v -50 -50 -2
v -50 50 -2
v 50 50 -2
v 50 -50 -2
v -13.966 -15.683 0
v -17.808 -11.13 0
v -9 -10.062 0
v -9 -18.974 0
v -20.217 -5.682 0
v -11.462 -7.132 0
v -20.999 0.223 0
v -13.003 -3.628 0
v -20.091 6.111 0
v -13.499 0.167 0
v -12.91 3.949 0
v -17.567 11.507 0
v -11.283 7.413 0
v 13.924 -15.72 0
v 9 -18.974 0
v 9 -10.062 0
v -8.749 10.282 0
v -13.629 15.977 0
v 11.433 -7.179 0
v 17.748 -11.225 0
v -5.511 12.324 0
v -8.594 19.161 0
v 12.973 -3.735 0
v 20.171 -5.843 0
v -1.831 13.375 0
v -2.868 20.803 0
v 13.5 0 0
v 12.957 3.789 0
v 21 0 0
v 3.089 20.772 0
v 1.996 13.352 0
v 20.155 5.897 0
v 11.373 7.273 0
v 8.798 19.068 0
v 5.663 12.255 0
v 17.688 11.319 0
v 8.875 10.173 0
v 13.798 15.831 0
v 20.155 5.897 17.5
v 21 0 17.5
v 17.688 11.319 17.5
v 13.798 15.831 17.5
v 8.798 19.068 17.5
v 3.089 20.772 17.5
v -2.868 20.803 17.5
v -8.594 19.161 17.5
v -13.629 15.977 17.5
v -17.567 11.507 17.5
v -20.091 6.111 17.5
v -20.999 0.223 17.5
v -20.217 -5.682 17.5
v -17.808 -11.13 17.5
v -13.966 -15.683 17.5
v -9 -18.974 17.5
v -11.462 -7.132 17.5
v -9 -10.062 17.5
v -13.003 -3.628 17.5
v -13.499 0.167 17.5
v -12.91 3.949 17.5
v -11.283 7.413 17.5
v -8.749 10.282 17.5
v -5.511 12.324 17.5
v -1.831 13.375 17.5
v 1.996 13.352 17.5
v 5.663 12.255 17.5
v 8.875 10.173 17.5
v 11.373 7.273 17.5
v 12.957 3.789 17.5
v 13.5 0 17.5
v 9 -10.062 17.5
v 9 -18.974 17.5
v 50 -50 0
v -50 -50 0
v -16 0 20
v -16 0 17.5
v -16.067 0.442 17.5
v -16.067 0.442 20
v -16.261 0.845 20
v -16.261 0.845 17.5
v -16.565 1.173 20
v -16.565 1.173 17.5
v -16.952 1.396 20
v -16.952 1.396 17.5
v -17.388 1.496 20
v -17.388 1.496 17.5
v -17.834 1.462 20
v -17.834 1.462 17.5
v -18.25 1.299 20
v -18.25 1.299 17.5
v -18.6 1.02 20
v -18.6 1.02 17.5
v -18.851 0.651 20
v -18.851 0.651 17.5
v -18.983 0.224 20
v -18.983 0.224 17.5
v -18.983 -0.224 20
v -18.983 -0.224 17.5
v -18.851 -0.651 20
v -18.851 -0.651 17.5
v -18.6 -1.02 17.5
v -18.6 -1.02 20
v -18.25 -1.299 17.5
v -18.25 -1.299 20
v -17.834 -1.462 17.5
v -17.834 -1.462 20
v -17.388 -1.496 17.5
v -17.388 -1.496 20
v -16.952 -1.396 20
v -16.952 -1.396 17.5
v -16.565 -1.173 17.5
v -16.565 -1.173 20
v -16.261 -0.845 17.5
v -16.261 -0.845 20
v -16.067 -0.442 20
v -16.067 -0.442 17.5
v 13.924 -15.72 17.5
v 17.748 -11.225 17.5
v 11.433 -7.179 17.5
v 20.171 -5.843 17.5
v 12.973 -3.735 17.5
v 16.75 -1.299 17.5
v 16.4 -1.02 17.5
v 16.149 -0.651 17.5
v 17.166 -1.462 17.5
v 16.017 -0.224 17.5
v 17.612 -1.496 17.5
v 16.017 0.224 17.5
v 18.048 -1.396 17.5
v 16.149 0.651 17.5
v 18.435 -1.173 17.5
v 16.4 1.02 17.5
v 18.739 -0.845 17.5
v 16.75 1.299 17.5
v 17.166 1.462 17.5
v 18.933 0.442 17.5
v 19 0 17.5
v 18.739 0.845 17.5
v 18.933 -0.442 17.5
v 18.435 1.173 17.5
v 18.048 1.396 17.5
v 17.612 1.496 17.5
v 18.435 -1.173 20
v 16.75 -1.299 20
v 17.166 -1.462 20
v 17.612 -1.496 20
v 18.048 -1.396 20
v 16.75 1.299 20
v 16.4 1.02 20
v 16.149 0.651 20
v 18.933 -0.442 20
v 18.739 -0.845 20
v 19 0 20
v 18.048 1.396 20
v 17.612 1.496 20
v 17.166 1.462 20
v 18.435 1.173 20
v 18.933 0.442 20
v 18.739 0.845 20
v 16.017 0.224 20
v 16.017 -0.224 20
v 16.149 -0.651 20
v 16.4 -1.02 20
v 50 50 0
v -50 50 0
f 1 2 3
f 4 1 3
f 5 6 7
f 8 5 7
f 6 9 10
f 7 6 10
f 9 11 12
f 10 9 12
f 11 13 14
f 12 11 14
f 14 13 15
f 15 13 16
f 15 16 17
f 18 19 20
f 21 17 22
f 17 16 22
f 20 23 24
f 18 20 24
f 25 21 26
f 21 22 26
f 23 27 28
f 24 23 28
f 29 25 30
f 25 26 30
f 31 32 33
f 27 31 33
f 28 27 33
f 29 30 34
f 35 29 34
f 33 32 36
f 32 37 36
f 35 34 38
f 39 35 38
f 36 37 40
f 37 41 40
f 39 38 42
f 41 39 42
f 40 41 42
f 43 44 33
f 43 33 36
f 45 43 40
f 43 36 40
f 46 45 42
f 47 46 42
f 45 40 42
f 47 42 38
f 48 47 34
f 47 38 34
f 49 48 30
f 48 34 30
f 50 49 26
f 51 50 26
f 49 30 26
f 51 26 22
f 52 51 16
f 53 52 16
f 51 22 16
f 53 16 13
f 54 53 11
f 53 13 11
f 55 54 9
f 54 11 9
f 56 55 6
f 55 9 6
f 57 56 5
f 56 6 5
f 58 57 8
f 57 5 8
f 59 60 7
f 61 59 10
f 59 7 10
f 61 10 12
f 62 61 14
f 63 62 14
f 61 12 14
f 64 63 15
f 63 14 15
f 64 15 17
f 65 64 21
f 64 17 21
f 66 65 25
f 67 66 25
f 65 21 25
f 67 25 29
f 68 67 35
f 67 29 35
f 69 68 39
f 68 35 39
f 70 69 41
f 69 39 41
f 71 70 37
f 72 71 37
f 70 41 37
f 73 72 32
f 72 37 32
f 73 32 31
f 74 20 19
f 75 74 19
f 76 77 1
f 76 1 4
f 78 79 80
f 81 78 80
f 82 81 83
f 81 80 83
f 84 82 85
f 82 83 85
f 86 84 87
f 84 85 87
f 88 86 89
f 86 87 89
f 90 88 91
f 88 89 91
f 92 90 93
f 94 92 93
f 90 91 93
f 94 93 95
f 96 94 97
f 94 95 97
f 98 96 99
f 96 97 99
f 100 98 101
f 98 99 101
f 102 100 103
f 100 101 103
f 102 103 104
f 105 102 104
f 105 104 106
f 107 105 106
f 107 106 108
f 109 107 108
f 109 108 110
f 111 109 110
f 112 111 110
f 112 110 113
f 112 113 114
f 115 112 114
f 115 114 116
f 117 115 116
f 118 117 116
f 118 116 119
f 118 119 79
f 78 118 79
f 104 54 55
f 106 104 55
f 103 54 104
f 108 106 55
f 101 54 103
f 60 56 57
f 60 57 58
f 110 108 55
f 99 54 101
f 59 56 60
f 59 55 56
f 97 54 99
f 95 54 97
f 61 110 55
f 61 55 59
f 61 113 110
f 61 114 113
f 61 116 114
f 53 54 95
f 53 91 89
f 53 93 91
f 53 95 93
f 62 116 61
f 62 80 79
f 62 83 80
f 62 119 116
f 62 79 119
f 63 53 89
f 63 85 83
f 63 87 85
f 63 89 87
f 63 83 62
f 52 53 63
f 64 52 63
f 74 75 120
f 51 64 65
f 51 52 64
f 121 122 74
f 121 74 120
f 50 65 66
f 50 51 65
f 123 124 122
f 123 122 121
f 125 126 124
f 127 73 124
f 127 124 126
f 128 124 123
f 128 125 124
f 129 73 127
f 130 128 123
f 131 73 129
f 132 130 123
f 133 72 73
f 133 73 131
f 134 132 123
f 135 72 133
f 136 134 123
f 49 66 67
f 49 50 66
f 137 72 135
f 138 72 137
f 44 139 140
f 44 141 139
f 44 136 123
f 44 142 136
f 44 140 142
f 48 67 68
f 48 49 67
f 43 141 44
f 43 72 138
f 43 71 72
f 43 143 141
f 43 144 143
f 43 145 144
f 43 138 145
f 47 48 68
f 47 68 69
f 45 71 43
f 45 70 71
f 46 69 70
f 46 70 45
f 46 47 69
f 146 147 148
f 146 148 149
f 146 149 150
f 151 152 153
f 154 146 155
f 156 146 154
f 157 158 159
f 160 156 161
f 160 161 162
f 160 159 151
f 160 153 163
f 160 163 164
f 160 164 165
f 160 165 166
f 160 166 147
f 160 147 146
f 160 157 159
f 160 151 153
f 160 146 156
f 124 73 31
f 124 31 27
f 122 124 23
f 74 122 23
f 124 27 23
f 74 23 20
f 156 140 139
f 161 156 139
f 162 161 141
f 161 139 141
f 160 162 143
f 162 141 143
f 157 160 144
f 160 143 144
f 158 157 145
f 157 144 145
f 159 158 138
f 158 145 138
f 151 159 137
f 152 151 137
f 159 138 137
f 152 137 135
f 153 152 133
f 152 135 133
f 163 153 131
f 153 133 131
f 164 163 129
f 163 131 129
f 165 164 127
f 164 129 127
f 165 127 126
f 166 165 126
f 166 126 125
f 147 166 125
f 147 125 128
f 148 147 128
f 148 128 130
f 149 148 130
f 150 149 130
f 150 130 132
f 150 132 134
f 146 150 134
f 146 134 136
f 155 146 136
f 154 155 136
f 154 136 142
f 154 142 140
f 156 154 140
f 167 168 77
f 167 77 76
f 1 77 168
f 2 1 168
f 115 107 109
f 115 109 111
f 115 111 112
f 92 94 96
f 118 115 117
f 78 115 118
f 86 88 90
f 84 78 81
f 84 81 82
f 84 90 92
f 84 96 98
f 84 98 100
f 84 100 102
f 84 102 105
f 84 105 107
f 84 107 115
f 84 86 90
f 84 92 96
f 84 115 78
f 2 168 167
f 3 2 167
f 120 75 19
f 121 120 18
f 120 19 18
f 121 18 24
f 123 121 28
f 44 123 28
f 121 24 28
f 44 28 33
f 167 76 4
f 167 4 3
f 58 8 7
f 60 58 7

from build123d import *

# Parameters (mm, degrees)
F0_R     = 1.5
F1_DEPTH = 17.5
F2_DEPTH = 20
F0_W     = 100
F0_H     = 100
F3_DEPTH = 2


with BuildPart() as f1:
    # F0 (on Top) → F1 (new body)
    with BuildSketch(Plane.XY):
        with BuildLine():
            ThreePointArc((-9, -10.0623058987), (-5.5113519213, 12.3237575439), (13.5, 0))
            ThreePointArc((13.5, 0), (12.3237575439, -5.5113519213), (9, -10.0623058987))
            Line((9, -10.0623058987), (9, -18.973665961))
            ThreePointArc((9, -18.973665961), (17.7482393493, -11.2249721603), (21, 0))
            ThreePointArc((21, 0), (-11.2249721603, 17.7482393493), (-9, -18.973665961))
            Line((-9, -18.973665961), (-9, -10.0623058987))
        make_face()
        with Locations((-17.5, 0)):
            Circle(F0_R, mode=Mode.SUBTRACT)
        with Locations((17.5, 0)):
            Circle(F0_R, mode=Mode.SUBTRACT)
    extrude(amount=F1_DEPTH)

    # F0 (on Top) → F2 (join)
    with BuildSketch(Plane.XY):
        with Locations((-17.5, 0)):
            Circle(F0_R)
        with Locations((17.5, 0)):
            Circle(F0_R)
    extrude(amount=F2_DEPTH)


with BuildPart() as f3:
    # F0 (on Top) → F3 (new body)
    with BuildSketch(Plane.XY):
        Rectangle(F0_W, F0_H)
        with BuildLine():
            Line((-9, -21.471963264), (-9, -18.973665961))
            ThreePointArc((-9, -18.973665961), (-11.2249721603, 17.7482393493), (21, 0))
            ThreePointArc((21, 0), (17.7482393493, -11.2249721603), (9, -18.973665961))
            Line((9, -18.973665961), (9, -21.471963264))
            Line((9, -21.471963264), (-9, -21.471963264))
        make_face(mode=Mode.SUBTRACT)
        with BuildLine():
            ThreePointArc((-9, -10.0623058987), (-5.5113519213, 12.3237575439), (13.5, 0))
            ThreePointArc((13.5, 0), (12.3237575439, -5.5113519213), (9, -10.0623058987))
            Line((9, -10.0623058987), (9, -18.973665961))
            ThreePointArc((9, -18.973665961), (17.7482393493, -11.2249721603), (21, 0))
            ThreePointArc((21, 0), (-11.2249721603, 17.7482393493), (-9, -18.973665961))
            Line((-9, -18.973665961), (-9, -10.0623058987))
        make_face()
        with Locations((-17.5, 0)):
            Circle(F0_R, mode=Mode.SUBTRACT)
        with Locations((17.5, 0)):
            Circle(F0_R, mode=Mode.SUBTRACT)
        with Locations((-17.5, 0)):
            Circle(F0_R)
        with Locations((17.5, 0)):
            Circle(F0_R)
        with BuildLine():
            ThreePointArc((9, -10.0623058987), (0, -13.5), (-9, -10.0623058987))
            Line((-9, -10.0623058987), (-9, -18.973665961))
            ThreePointArc((-9, -18.973665961), (0, -21), (9, -18.973665961))
            Line((9, -18.973665961), (9, -10.0623058987))
        make_face()
        with BuildLine():
            ThreePointArc((9, -18.973665961), (0, -21), (-9, -18.973665961))
            Line((-9, -18.973665961), (-9, -21.471963264))
            Line((-9, -21.471963264), (9, -21.471963264))
            Line((9, -21.471963264), (9, -18.973665961))
        make_face()
        with BuildLine():
            ThreePointArc((9, -10.0623058987), (12.3237575439, -5.5113519213), (13.5, 0))
            ThreePointArc((13.5, 0), (-5.5113519213, 12.3237575439), (-9, -10.0623058987))
            Line((-9, -10.0623058987), (-9, -8.9602405205))
            Line((-9, -8.9602405205), (9, -8.9602405205))
            Line((9, -8.9602405205), (9, -10.0623058987))
        make_face()
        with BuildLine():
            Line((-9, -8.9602405205), (-9, -10.0623058987))
            ThreePointArc((-9, -10.0623058987), (0, -13.5), (9, -10.0623058987))
            Line((9, -10.0623058987), (9, -8.9602405205))
            Line((9, -8.9602405205), (-9, -8.9602405205))
        make_face()
    extrude(amount=-F3_DEPTH)


solid = Compound([f1.part, f3.part])
